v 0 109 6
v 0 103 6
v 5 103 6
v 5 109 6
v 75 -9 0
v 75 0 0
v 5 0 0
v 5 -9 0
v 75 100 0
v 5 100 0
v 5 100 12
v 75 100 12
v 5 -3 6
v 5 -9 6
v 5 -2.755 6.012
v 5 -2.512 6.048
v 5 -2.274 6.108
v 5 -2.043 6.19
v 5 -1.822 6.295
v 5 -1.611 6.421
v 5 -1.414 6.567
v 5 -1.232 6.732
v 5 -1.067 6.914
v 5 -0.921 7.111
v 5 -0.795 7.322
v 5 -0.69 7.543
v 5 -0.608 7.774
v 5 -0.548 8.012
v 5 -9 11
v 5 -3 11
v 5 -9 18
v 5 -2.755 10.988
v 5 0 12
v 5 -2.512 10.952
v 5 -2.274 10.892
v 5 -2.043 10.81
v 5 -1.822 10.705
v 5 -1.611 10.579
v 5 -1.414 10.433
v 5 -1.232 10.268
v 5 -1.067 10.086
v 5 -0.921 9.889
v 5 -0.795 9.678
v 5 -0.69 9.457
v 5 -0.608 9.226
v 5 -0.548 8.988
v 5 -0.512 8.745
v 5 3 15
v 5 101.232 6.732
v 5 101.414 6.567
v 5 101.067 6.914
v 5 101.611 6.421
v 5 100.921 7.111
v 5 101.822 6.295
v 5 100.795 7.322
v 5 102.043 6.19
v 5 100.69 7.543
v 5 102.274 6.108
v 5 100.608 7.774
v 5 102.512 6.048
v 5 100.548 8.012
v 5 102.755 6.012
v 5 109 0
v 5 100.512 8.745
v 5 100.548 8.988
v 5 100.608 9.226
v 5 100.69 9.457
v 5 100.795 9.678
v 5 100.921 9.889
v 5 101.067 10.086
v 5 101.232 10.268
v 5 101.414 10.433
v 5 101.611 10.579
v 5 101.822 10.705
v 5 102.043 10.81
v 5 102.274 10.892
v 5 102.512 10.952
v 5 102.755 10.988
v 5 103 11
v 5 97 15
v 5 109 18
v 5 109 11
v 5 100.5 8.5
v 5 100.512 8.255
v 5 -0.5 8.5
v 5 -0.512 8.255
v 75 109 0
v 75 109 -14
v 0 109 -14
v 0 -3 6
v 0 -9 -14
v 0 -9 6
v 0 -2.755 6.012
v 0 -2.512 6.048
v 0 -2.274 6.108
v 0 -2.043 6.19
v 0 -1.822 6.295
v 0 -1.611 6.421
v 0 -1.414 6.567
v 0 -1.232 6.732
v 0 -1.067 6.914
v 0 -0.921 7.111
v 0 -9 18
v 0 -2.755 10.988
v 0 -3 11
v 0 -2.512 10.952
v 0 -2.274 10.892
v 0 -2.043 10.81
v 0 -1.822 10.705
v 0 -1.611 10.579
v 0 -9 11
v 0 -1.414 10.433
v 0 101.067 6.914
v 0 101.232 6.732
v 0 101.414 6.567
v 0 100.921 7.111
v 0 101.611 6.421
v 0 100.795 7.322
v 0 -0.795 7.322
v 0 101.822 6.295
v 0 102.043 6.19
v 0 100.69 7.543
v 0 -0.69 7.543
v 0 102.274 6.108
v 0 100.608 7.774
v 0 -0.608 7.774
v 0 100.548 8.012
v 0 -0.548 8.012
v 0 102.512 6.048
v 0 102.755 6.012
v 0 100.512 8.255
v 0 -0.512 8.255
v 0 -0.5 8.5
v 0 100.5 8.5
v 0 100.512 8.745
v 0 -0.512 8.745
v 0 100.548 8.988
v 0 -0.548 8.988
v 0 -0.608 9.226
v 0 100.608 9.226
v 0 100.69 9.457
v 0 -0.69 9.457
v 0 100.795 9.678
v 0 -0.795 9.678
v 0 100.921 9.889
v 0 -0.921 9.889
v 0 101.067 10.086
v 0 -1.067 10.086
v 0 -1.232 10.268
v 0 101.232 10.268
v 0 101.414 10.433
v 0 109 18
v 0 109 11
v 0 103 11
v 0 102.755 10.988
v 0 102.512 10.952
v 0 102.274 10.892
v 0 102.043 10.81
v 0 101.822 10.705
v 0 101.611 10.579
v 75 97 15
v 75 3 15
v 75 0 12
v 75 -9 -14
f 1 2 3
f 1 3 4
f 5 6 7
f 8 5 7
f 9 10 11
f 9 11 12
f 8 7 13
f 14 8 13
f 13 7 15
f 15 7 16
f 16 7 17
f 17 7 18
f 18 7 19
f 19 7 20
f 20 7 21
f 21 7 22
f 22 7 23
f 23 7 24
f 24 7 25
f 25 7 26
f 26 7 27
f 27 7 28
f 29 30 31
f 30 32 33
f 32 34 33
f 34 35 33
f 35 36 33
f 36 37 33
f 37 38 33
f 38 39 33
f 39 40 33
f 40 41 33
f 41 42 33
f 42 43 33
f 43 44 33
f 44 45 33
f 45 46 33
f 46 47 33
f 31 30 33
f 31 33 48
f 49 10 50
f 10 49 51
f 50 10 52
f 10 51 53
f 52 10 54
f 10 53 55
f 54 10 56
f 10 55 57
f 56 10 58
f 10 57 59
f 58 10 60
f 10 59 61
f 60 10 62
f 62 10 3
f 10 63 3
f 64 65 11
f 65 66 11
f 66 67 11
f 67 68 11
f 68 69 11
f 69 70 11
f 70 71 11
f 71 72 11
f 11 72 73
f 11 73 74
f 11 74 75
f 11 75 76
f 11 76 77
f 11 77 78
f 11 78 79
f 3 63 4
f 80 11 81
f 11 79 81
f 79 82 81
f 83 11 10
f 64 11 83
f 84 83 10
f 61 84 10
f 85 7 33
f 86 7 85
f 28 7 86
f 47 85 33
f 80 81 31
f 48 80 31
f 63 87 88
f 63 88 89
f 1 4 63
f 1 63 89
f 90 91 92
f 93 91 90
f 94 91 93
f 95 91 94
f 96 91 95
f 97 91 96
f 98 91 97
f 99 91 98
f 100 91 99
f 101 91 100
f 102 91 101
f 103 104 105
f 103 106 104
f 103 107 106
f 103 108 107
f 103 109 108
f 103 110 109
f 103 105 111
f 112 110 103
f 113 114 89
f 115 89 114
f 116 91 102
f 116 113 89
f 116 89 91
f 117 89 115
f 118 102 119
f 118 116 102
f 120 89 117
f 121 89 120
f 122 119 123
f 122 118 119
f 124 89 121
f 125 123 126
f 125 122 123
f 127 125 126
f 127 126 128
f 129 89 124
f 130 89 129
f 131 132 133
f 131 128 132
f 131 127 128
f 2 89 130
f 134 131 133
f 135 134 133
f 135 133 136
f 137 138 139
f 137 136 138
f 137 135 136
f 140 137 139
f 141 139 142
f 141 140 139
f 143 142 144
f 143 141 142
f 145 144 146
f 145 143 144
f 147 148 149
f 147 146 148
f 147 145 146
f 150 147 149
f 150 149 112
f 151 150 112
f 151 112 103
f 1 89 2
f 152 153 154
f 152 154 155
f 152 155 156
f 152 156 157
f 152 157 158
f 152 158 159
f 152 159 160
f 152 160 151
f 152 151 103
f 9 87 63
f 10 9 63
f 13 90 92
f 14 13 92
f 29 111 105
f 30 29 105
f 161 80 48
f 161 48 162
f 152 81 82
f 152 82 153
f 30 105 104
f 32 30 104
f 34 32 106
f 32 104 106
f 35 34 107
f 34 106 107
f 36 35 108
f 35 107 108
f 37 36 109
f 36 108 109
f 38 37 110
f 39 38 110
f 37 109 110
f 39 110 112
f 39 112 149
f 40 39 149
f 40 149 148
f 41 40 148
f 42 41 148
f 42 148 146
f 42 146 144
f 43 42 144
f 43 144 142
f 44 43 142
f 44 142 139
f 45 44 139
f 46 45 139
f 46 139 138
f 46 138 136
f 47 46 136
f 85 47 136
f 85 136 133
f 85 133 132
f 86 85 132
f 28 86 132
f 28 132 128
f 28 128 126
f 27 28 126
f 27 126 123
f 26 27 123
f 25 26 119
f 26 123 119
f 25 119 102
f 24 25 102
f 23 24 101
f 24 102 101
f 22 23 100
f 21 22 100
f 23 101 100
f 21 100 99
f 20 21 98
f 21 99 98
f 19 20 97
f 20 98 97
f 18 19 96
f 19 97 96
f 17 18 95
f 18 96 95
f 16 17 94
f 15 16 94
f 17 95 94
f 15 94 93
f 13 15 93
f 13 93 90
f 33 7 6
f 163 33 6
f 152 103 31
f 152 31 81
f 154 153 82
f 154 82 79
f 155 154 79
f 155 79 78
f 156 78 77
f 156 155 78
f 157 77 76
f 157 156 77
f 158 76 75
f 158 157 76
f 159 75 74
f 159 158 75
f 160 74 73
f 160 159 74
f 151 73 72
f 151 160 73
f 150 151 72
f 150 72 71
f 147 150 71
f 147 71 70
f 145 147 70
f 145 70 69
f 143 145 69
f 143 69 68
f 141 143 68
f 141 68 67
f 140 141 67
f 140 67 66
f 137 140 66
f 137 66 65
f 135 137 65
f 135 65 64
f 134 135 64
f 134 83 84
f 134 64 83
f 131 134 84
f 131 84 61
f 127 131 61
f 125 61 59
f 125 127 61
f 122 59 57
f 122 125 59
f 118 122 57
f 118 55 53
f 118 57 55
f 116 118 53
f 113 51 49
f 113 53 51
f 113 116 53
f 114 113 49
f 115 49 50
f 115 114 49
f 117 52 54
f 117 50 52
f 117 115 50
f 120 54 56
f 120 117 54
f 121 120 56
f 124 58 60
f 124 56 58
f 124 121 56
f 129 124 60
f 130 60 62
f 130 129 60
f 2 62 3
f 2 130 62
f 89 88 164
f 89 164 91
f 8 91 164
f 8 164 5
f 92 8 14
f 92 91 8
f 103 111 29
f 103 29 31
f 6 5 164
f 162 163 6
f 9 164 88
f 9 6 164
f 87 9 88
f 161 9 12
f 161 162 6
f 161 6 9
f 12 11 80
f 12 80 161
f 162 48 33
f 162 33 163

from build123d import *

# Parameters (mm, degrees)
SKETCH_1_W          = 75
SKETCH_1_H          = 100
EXTRUDE_1_DEPTH     = 18
SKETCH_2_W          = 75
SKETCH_2_H          = 118
EXTRUDE_2_DEPTH     = 14
SKETCH_3_W          = 18
SKETCH_3_H          = 118
EXTRUDE_3_DEPTH     = 5
CUT_EXTRUDE_1_DEPTH = 134.529023062
SKETCH_5_W          = 70
SKETCH_5_H          = 100
CUT_EXTRUDE_2_DEPTH = 3
CHAMFER_1_SIZE      = 3


with BuildPart() as part:
    # Эскиз1 → Бобышка-Вытянуть1 (new body)
    with BuildSketch(Plane.XY):
        with Locations((37.5, 50)):
            Rectangle(SKETCH_1_W, SKETCH_1_H)
    extrude(amount=EXTRUDE_1_DEPTH)

    # Эскиз2 → Бобышка-Вытянуть2 (add)
    with BuildSketch(Plane(origin=(0, 0, 0), x_dir=(-1, 0, 0), z_dir=(0, 0, -1))):
        with Locations((-37.5, 50)):
            Rectangle(SKETCH_2_W, SKETCH_2_H)
    extrude(amount=EXTRUDE_2_DEPTH)

    # Эскиз3 → Бобышка-Вытянуть3 (add)
    with BuildSketch(Plane.ZY):
        with Locations((9, 50)):
            Rectangle(SKETCH_3_W, SKETCH_3_H)
    extrude(amount=-EXTRUDE_3_DEPTH)

    # Эскиз4 → Вырез-Вытянуть1 (cut, through all)
    with BuildSketch(Plane.ZY):
        with BuildLine():
            Line((11, 114.734094435), (11, 103))
            ThreePointArc((11, 103), (8.5, 100.5), (6, 103))
            Line((6, 103), (6, 114.734094435))
            ThreePointArc((6, 114.734094435), (8.5, 117.234094435), (11, 114.734094435))
        make_face()
        with BuildLine():
            Line((11, -14.734094435), (11, -3))
            ThreePointArc((11, -3), (8.5, -0.5), (6, -3))
            Line((6, -3), (6, -14.734094435))
            ThreePointArc((6, -14.734094435), (8.5, -17.234094435), (11, -14.734094435))
        make_face()
    extrude(amount=-CUT_EXTRUDE_1_DEPTH, mode=Mode.SUBTRACT)

    # Эскиз5 → Вырез-Вытянуть2 (cut)
    with BuildSketch(Plane.XY.offset(18)):
        with Locations((40, 50)):
            Rectangle(SKETCH_5_W, SKETCH_5_H)
    extrude(amount=-CUT_EXTRUDE_2_DEPTH, mode=Mode.SUBTRACT)

    # Фаска1
    chamfer_1_edges = [part.edges().sort_by_distance(p)[0] for p in [
        (40, 100, 15),
        (40, 0, 15),
    ]]
    chamfer(chamfer_1_edges, length=CHAMFER_1_SIZE)


solid = part.part
